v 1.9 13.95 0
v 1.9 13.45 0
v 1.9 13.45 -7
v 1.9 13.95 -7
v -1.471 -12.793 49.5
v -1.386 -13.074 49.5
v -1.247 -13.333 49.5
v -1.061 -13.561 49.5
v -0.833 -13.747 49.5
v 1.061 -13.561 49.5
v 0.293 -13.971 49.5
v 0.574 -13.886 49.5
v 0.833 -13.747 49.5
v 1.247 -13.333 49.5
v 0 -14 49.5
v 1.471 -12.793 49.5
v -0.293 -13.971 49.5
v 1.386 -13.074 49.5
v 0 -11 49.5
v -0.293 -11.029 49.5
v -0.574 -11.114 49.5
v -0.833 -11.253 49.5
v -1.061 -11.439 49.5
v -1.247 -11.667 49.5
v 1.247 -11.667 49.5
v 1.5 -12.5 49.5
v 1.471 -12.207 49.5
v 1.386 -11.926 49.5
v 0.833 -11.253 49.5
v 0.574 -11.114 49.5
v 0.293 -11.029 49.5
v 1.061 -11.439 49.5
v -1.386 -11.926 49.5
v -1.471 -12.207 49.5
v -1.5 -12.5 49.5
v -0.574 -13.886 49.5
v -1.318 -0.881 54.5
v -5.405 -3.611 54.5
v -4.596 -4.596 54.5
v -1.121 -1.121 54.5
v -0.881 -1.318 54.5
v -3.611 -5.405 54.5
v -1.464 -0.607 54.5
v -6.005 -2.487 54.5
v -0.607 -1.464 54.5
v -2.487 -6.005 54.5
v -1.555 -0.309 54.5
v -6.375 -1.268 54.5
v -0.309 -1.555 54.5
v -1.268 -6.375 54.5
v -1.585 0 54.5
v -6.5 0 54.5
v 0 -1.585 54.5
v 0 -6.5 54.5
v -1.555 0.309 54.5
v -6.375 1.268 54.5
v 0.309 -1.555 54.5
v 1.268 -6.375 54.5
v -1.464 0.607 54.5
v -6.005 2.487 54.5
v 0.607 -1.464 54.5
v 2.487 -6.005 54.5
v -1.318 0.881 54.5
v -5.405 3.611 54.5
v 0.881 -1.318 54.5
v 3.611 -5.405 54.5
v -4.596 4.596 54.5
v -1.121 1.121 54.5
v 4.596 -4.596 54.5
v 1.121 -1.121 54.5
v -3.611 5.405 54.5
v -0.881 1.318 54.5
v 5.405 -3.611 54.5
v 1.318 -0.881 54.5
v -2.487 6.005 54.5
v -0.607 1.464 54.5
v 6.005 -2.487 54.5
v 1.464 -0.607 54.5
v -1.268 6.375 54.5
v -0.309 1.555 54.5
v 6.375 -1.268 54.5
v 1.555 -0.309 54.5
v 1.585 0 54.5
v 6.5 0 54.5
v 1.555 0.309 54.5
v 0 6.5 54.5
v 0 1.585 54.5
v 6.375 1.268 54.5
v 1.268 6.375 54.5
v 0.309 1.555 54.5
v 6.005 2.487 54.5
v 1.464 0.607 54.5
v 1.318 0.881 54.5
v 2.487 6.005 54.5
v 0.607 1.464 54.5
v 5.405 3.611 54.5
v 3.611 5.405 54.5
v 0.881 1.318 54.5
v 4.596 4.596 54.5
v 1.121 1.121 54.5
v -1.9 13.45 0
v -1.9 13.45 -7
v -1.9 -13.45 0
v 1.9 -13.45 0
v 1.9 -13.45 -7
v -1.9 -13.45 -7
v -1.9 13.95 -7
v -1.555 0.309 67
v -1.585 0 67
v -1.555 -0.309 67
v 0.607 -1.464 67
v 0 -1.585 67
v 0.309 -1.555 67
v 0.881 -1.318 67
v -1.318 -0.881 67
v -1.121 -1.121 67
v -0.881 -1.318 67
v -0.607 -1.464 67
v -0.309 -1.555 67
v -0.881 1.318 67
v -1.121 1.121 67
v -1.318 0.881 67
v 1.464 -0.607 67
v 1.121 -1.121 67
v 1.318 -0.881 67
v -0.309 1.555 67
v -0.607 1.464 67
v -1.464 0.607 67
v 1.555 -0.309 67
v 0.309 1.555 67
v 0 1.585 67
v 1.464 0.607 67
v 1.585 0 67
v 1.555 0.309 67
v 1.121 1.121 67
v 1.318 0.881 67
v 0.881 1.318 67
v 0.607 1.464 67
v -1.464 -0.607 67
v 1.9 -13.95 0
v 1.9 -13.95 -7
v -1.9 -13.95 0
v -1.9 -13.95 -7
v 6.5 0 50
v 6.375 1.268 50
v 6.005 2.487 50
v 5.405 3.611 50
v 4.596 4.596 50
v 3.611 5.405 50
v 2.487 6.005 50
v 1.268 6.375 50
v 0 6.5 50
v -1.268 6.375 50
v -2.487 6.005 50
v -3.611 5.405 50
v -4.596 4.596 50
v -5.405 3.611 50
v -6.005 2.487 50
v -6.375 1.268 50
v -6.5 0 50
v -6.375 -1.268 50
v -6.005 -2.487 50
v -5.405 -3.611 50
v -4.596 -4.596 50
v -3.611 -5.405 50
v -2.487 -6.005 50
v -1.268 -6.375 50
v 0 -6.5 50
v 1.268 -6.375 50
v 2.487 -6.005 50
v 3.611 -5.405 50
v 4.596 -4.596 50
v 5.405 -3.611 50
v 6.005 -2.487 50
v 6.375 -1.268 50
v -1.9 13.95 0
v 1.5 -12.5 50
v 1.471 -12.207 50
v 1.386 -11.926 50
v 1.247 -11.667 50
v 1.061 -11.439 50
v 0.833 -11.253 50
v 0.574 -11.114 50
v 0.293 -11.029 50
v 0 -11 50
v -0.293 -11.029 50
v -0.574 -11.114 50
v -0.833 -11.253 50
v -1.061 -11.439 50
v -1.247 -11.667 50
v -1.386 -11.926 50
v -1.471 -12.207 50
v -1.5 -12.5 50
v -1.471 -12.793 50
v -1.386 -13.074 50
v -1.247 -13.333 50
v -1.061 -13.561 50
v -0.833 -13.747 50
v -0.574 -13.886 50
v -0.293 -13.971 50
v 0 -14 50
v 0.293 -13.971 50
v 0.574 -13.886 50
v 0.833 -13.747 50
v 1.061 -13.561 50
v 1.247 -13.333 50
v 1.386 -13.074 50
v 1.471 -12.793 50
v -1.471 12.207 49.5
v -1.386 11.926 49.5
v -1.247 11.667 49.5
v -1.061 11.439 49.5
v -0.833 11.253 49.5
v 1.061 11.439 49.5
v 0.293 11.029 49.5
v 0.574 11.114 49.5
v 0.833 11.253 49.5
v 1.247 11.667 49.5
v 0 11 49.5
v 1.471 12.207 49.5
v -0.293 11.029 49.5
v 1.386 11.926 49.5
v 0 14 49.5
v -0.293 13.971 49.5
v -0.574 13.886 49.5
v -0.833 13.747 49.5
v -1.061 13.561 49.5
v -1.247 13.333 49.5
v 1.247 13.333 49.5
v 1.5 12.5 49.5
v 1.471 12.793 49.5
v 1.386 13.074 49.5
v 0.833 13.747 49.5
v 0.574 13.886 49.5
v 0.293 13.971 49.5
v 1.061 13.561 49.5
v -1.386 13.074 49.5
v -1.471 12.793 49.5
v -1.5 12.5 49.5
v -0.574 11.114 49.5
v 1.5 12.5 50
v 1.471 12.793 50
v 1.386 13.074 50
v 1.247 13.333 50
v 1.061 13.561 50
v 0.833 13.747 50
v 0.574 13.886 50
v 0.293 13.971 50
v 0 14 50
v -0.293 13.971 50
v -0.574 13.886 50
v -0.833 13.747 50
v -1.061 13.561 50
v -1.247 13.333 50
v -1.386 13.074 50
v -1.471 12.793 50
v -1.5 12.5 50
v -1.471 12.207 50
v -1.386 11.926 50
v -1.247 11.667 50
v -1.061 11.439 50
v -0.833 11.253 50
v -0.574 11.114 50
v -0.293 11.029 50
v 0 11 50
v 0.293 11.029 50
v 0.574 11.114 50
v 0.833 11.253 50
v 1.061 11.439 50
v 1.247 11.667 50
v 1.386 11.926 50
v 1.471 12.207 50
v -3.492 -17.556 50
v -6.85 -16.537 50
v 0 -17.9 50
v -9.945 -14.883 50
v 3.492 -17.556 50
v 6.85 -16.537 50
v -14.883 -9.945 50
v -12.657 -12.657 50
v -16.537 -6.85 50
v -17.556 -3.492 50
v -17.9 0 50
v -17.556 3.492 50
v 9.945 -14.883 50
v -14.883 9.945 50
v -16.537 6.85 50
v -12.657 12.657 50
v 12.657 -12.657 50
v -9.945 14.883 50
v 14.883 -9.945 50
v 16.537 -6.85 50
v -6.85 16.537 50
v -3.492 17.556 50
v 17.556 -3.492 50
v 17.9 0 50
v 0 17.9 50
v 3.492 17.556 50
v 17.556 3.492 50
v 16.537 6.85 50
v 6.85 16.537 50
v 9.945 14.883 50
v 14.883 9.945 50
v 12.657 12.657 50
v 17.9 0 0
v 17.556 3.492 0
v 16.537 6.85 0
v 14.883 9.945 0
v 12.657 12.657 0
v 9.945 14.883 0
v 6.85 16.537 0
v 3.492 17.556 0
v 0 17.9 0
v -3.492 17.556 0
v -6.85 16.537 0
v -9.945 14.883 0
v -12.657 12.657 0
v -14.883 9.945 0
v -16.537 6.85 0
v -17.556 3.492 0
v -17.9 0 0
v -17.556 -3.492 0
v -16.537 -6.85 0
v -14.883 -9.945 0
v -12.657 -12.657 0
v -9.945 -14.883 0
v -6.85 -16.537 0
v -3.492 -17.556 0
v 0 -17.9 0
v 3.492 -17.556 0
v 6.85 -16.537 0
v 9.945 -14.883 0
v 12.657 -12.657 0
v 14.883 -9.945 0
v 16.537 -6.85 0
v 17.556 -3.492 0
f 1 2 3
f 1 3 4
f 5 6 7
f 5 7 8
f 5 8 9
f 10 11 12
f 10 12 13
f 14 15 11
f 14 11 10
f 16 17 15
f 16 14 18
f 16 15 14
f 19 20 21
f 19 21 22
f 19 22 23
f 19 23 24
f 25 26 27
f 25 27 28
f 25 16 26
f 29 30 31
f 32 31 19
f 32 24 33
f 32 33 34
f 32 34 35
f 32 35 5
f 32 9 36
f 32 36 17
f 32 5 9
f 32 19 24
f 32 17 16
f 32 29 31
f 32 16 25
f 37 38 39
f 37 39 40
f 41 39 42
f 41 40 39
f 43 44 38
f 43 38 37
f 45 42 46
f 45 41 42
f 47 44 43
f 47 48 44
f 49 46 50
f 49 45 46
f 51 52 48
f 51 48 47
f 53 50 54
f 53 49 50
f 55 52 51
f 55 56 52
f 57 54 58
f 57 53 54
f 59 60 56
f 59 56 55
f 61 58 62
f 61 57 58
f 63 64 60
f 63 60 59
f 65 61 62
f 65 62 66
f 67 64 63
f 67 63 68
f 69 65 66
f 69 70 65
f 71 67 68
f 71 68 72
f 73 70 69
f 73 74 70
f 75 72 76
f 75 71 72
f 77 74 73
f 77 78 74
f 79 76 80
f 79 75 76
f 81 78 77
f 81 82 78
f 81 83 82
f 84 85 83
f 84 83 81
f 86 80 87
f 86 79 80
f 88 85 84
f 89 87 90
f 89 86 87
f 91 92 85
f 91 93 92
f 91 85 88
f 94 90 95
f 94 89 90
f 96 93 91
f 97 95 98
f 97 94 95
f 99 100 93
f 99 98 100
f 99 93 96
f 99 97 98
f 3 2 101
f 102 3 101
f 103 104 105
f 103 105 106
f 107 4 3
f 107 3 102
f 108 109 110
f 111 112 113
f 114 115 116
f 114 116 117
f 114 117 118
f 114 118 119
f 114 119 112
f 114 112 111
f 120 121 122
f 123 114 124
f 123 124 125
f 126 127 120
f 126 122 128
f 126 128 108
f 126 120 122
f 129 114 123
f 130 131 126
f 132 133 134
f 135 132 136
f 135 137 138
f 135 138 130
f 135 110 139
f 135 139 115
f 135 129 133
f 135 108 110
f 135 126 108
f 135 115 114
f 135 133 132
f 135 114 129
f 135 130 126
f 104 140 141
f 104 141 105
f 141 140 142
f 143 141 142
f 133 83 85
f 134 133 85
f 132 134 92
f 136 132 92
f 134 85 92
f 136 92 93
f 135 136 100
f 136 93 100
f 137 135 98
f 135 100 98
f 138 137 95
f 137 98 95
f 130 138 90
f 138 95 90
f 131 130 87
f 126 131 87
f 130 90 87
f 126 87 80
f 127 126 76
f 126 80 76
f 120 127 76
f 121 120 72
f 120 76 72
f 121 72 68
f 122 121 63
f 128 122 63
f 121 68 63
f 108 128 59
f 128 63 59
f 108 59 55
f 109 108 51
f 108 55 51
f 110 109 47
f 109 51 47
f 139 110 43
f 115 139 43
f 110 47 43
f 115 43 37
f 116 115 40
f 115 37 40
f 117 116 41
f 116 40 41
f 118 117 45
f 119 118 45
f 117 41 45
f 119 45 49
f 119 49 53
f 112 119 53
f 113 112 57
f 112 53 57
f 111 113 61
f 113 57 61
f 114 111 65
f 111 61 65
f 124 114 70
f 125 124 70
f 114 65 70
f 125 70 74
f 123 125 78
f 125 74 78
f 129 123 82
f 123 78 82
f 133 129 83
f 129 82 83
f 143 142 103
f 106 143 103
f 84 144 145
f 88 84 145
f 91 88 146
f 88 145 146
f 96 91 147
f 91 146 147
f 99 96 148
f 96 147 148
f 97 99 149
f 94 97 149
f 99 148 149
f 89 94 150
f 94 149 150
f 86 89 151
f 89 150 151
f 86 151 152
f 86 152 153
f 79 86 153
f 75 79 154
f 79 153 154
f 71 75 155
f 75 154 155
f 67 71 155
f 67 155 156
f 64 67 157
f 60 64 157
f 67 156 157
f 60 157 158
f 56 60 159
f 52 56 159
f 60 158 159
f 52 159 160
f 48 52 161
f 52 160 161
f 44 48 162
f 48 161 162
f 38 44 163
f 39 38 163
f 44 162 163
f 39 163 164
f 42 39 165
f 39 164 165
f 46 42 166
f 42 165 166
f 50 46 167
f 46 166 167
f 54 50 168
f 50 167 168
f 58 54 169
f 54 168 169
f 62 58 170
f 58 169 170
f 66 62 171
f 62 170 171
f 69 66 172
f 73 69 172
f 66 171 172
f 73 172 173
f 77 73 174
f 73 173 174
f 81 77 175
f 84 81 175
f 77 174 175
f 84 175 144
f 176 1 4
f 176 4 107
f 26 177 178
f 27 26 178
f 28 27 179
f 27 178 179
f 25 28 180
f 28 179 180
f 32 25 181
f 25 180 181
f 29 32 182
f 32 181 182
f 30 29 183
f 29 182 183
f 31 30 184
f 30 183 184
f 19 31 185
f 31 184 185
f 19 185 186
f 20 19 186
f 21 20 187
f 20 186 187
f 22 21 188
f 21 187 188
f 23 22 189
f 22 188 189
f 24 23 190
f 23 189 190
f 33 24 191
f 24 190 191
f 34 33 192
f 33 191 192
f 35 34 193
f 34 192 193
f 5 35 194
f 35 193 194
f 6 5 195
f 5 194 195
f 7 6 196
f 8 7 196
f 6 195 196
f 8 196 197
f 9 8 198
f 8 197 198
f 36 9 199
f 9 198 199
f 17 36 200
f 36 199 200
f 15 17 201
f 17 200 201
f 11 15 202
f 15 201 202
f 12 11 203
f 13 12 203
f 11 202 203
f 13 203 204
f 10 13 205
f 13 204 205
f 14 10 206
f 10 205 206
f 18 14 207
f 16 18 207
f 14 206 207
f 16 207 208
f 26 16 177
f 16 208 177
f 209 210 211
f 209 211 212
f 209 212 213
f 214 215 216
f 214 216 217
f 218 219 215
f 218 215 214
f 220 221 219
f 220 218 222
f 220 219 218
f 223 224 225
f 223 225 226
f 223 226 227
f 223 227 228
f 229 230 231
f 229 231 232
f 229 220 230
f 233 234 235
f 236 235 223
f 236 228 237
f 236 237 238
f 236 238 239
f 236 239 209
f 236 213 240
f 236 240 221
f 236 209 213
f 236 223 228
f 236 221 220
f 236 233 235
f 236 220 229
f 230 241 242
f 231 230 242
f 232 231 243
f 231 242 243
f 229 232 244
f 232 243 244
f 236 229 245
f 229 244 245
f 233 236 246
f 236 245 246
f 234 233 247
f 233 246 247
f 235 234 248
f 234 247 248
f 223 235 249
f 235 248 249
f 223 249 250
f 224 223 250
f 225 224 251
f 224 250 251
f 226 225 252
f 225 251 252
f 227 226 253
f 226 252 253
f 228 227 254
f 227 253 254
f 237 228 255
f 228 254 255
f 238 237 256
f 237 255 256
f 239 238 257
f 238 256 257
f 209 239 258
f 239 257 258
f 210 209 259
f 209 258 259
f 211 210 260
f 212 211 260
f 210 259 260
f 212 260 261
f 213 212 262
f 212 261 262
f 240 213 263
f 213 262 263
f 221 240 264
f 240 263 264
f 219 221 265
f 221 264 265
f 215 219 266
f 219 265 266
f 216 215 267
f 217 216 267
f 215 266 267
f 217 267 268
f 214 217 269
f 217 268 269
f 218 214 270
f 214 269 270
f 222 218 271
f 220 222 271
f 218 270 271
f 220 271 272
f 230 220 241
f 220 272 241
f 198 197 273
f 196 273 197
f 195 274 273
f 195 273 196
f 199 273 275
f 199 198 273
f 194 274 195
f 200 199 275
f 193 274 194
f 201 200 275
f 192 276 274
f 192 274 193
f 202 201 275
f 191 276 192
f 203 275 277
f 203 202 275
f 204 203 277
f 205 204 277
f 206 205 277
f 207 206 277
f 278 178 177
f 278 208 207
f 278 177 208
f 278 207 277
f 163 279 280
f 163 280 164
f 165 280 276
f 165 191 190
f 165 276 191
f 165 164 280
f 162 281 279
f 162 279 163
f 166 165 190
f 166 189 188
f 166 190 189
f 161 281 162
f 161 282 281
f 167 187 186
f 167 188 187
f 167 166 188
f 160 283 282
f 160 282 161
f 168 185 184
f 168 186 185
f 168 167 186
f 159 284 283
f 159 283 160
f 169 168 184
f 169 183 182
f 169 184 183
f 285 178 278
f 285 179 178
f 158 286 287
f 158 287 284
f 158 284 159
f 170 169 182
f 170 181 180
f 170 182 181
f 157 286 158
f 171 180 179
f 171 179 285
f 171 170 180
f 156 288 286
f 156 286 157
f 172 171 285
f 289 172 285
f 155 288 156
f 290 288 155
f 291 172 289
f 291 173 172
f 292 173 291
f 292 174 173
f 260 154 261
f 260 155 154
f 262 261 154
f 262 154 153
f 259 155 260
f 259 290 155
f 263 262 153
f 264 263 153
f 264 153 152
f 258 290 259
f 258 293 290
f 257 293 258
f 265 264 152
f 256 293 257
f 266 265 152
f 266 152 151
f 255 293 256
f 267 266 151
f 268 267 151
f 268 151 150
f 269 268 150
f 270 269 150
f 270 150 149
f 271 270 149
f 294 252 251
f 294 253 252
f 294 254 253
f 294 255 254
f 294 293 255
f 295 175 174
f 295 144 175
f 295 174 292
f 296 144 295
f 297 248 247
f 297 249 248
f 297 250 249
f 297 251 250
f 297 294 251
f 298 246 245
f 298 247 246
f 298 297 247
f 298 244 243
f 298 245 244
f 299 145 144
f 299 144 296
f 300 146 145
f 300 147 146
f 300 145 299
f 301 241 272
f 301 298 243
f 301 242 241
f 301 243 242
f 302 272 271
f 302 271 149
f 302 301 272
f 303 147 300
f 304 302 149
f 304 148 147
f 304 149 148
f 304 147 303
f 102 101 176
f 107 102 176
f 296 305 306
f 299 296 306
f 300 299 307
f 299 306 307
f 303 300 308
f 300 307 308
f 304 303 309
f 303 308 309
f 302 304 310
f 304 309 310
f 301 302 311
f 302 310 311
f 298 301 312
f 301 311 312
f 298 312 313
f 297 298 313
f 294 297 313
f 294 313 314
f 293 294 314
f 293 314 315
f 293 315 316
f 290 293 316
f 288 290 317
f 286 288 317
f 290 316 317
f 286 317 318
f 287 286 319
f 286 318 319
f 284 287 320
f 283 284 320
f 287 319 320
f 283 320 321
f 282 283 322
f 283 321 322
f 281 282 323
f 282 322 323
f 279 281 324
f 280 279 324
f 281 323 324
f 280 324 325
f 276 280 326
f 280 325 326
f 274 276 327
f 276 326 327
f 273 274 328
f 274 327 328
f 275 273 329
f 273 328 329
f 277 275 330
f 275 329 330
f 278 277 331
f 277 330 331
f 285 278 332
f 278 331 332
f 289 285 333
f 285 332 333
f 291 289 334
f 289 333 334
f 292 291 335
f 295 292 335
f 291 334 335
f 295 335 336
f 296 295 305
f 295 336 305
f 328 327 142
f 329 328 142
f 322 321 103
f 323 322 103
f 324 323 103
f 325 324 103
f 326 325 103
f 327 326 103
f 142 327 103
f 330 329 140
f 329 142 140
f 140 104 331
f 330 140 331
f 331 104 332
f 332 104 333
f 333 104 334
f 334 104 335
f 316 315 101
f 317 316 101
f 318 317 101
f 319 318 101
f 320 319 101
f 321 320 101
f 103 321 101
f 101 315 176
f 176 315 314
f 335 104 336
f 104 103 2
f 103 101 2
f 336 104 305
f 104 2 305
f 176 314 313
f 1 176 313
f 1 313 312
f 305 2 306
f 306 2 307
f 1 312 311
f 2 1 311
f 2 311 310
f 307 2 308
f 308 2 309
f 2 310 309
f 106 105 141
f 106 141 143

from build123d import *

# Parameters (mm, degrees)
SKETCH_2_R          = 17.9
EXTRUDE_1_DEPTH     = 50
SKETCH_3_R          = 6.5
EXTRUDE_2_DEPTH     = 4.5
SKETCH_4_R          = 1.585
EXTRUDE_5_DEPTH     = 12.5
SKETCH_5_R          = 1.5
CUT_EXTRUDE_1_DEPTH = 0.5
SKETCH_6_W          = 3.8
SKETCH_6_H          = 0.5
EXTRUDE_6_DEPTH     = 7


with BuildPart() as part:
    # ｽｹｯﾁ2 → ﾎﾞｽ - 押し出し1 (new body)
    with BuildSketch(Plane.XY):
        Circle(SKETCH_2_R)
    extrude(amount=EXTRUDE_1_DEPTH)

    # ｽｹｯﾁ3 → ﾎﾞｽ - 押し出し2 (add)
    with BuildSketch(Plane.XY.offset(50)):
        Circle(SKETCH_3_R)
    extrude(amount=EXTRUDE_2_DEPTH)

    # ｽｹｯﾁ4 → ﾎﾞｽ - 押し出し5 (add)
    with BuildSketch(Plane.XY.offset(54.5)):
        Circle(SKETCH_4_R)
    extrude(amount=EXTRUDE_5_DEPTH)

    # ｽｹｯﾁ5 → ｶｯﾄ - 押し出し1 (cut)
    with BuildSketch(Plane.XY.offset(50)):
        with Locations((0, 12.5)):
            Circle(SKETCH_5_R)
        with Locations((0, -12.5)):
            Circle(SKETCH_5_R)
    extrude(amount=-CUT_EXTRUDE_1_DEPTH, mode=Mode.SUBTRACT)

    # ｽｹｯﾁ6 → ﾎﾞｽ - 押し出し6 (add)
    with BuildSketch(Plane(origin=(0, 0, 0), x_dir=(-1, 0, 0), z_dir=(0, 0, -1))):
        with Locations((0, 13.7)):
            Rectangle(SKETCH_6_W, SKETCH_6_H)
        with Locations((0, -13.7)):
            Rectangle(SKETCH_6_W, SKETCH_6_H)
    extrude(amount=EXTRUDE_6_DEPTH)


solid = part.part
